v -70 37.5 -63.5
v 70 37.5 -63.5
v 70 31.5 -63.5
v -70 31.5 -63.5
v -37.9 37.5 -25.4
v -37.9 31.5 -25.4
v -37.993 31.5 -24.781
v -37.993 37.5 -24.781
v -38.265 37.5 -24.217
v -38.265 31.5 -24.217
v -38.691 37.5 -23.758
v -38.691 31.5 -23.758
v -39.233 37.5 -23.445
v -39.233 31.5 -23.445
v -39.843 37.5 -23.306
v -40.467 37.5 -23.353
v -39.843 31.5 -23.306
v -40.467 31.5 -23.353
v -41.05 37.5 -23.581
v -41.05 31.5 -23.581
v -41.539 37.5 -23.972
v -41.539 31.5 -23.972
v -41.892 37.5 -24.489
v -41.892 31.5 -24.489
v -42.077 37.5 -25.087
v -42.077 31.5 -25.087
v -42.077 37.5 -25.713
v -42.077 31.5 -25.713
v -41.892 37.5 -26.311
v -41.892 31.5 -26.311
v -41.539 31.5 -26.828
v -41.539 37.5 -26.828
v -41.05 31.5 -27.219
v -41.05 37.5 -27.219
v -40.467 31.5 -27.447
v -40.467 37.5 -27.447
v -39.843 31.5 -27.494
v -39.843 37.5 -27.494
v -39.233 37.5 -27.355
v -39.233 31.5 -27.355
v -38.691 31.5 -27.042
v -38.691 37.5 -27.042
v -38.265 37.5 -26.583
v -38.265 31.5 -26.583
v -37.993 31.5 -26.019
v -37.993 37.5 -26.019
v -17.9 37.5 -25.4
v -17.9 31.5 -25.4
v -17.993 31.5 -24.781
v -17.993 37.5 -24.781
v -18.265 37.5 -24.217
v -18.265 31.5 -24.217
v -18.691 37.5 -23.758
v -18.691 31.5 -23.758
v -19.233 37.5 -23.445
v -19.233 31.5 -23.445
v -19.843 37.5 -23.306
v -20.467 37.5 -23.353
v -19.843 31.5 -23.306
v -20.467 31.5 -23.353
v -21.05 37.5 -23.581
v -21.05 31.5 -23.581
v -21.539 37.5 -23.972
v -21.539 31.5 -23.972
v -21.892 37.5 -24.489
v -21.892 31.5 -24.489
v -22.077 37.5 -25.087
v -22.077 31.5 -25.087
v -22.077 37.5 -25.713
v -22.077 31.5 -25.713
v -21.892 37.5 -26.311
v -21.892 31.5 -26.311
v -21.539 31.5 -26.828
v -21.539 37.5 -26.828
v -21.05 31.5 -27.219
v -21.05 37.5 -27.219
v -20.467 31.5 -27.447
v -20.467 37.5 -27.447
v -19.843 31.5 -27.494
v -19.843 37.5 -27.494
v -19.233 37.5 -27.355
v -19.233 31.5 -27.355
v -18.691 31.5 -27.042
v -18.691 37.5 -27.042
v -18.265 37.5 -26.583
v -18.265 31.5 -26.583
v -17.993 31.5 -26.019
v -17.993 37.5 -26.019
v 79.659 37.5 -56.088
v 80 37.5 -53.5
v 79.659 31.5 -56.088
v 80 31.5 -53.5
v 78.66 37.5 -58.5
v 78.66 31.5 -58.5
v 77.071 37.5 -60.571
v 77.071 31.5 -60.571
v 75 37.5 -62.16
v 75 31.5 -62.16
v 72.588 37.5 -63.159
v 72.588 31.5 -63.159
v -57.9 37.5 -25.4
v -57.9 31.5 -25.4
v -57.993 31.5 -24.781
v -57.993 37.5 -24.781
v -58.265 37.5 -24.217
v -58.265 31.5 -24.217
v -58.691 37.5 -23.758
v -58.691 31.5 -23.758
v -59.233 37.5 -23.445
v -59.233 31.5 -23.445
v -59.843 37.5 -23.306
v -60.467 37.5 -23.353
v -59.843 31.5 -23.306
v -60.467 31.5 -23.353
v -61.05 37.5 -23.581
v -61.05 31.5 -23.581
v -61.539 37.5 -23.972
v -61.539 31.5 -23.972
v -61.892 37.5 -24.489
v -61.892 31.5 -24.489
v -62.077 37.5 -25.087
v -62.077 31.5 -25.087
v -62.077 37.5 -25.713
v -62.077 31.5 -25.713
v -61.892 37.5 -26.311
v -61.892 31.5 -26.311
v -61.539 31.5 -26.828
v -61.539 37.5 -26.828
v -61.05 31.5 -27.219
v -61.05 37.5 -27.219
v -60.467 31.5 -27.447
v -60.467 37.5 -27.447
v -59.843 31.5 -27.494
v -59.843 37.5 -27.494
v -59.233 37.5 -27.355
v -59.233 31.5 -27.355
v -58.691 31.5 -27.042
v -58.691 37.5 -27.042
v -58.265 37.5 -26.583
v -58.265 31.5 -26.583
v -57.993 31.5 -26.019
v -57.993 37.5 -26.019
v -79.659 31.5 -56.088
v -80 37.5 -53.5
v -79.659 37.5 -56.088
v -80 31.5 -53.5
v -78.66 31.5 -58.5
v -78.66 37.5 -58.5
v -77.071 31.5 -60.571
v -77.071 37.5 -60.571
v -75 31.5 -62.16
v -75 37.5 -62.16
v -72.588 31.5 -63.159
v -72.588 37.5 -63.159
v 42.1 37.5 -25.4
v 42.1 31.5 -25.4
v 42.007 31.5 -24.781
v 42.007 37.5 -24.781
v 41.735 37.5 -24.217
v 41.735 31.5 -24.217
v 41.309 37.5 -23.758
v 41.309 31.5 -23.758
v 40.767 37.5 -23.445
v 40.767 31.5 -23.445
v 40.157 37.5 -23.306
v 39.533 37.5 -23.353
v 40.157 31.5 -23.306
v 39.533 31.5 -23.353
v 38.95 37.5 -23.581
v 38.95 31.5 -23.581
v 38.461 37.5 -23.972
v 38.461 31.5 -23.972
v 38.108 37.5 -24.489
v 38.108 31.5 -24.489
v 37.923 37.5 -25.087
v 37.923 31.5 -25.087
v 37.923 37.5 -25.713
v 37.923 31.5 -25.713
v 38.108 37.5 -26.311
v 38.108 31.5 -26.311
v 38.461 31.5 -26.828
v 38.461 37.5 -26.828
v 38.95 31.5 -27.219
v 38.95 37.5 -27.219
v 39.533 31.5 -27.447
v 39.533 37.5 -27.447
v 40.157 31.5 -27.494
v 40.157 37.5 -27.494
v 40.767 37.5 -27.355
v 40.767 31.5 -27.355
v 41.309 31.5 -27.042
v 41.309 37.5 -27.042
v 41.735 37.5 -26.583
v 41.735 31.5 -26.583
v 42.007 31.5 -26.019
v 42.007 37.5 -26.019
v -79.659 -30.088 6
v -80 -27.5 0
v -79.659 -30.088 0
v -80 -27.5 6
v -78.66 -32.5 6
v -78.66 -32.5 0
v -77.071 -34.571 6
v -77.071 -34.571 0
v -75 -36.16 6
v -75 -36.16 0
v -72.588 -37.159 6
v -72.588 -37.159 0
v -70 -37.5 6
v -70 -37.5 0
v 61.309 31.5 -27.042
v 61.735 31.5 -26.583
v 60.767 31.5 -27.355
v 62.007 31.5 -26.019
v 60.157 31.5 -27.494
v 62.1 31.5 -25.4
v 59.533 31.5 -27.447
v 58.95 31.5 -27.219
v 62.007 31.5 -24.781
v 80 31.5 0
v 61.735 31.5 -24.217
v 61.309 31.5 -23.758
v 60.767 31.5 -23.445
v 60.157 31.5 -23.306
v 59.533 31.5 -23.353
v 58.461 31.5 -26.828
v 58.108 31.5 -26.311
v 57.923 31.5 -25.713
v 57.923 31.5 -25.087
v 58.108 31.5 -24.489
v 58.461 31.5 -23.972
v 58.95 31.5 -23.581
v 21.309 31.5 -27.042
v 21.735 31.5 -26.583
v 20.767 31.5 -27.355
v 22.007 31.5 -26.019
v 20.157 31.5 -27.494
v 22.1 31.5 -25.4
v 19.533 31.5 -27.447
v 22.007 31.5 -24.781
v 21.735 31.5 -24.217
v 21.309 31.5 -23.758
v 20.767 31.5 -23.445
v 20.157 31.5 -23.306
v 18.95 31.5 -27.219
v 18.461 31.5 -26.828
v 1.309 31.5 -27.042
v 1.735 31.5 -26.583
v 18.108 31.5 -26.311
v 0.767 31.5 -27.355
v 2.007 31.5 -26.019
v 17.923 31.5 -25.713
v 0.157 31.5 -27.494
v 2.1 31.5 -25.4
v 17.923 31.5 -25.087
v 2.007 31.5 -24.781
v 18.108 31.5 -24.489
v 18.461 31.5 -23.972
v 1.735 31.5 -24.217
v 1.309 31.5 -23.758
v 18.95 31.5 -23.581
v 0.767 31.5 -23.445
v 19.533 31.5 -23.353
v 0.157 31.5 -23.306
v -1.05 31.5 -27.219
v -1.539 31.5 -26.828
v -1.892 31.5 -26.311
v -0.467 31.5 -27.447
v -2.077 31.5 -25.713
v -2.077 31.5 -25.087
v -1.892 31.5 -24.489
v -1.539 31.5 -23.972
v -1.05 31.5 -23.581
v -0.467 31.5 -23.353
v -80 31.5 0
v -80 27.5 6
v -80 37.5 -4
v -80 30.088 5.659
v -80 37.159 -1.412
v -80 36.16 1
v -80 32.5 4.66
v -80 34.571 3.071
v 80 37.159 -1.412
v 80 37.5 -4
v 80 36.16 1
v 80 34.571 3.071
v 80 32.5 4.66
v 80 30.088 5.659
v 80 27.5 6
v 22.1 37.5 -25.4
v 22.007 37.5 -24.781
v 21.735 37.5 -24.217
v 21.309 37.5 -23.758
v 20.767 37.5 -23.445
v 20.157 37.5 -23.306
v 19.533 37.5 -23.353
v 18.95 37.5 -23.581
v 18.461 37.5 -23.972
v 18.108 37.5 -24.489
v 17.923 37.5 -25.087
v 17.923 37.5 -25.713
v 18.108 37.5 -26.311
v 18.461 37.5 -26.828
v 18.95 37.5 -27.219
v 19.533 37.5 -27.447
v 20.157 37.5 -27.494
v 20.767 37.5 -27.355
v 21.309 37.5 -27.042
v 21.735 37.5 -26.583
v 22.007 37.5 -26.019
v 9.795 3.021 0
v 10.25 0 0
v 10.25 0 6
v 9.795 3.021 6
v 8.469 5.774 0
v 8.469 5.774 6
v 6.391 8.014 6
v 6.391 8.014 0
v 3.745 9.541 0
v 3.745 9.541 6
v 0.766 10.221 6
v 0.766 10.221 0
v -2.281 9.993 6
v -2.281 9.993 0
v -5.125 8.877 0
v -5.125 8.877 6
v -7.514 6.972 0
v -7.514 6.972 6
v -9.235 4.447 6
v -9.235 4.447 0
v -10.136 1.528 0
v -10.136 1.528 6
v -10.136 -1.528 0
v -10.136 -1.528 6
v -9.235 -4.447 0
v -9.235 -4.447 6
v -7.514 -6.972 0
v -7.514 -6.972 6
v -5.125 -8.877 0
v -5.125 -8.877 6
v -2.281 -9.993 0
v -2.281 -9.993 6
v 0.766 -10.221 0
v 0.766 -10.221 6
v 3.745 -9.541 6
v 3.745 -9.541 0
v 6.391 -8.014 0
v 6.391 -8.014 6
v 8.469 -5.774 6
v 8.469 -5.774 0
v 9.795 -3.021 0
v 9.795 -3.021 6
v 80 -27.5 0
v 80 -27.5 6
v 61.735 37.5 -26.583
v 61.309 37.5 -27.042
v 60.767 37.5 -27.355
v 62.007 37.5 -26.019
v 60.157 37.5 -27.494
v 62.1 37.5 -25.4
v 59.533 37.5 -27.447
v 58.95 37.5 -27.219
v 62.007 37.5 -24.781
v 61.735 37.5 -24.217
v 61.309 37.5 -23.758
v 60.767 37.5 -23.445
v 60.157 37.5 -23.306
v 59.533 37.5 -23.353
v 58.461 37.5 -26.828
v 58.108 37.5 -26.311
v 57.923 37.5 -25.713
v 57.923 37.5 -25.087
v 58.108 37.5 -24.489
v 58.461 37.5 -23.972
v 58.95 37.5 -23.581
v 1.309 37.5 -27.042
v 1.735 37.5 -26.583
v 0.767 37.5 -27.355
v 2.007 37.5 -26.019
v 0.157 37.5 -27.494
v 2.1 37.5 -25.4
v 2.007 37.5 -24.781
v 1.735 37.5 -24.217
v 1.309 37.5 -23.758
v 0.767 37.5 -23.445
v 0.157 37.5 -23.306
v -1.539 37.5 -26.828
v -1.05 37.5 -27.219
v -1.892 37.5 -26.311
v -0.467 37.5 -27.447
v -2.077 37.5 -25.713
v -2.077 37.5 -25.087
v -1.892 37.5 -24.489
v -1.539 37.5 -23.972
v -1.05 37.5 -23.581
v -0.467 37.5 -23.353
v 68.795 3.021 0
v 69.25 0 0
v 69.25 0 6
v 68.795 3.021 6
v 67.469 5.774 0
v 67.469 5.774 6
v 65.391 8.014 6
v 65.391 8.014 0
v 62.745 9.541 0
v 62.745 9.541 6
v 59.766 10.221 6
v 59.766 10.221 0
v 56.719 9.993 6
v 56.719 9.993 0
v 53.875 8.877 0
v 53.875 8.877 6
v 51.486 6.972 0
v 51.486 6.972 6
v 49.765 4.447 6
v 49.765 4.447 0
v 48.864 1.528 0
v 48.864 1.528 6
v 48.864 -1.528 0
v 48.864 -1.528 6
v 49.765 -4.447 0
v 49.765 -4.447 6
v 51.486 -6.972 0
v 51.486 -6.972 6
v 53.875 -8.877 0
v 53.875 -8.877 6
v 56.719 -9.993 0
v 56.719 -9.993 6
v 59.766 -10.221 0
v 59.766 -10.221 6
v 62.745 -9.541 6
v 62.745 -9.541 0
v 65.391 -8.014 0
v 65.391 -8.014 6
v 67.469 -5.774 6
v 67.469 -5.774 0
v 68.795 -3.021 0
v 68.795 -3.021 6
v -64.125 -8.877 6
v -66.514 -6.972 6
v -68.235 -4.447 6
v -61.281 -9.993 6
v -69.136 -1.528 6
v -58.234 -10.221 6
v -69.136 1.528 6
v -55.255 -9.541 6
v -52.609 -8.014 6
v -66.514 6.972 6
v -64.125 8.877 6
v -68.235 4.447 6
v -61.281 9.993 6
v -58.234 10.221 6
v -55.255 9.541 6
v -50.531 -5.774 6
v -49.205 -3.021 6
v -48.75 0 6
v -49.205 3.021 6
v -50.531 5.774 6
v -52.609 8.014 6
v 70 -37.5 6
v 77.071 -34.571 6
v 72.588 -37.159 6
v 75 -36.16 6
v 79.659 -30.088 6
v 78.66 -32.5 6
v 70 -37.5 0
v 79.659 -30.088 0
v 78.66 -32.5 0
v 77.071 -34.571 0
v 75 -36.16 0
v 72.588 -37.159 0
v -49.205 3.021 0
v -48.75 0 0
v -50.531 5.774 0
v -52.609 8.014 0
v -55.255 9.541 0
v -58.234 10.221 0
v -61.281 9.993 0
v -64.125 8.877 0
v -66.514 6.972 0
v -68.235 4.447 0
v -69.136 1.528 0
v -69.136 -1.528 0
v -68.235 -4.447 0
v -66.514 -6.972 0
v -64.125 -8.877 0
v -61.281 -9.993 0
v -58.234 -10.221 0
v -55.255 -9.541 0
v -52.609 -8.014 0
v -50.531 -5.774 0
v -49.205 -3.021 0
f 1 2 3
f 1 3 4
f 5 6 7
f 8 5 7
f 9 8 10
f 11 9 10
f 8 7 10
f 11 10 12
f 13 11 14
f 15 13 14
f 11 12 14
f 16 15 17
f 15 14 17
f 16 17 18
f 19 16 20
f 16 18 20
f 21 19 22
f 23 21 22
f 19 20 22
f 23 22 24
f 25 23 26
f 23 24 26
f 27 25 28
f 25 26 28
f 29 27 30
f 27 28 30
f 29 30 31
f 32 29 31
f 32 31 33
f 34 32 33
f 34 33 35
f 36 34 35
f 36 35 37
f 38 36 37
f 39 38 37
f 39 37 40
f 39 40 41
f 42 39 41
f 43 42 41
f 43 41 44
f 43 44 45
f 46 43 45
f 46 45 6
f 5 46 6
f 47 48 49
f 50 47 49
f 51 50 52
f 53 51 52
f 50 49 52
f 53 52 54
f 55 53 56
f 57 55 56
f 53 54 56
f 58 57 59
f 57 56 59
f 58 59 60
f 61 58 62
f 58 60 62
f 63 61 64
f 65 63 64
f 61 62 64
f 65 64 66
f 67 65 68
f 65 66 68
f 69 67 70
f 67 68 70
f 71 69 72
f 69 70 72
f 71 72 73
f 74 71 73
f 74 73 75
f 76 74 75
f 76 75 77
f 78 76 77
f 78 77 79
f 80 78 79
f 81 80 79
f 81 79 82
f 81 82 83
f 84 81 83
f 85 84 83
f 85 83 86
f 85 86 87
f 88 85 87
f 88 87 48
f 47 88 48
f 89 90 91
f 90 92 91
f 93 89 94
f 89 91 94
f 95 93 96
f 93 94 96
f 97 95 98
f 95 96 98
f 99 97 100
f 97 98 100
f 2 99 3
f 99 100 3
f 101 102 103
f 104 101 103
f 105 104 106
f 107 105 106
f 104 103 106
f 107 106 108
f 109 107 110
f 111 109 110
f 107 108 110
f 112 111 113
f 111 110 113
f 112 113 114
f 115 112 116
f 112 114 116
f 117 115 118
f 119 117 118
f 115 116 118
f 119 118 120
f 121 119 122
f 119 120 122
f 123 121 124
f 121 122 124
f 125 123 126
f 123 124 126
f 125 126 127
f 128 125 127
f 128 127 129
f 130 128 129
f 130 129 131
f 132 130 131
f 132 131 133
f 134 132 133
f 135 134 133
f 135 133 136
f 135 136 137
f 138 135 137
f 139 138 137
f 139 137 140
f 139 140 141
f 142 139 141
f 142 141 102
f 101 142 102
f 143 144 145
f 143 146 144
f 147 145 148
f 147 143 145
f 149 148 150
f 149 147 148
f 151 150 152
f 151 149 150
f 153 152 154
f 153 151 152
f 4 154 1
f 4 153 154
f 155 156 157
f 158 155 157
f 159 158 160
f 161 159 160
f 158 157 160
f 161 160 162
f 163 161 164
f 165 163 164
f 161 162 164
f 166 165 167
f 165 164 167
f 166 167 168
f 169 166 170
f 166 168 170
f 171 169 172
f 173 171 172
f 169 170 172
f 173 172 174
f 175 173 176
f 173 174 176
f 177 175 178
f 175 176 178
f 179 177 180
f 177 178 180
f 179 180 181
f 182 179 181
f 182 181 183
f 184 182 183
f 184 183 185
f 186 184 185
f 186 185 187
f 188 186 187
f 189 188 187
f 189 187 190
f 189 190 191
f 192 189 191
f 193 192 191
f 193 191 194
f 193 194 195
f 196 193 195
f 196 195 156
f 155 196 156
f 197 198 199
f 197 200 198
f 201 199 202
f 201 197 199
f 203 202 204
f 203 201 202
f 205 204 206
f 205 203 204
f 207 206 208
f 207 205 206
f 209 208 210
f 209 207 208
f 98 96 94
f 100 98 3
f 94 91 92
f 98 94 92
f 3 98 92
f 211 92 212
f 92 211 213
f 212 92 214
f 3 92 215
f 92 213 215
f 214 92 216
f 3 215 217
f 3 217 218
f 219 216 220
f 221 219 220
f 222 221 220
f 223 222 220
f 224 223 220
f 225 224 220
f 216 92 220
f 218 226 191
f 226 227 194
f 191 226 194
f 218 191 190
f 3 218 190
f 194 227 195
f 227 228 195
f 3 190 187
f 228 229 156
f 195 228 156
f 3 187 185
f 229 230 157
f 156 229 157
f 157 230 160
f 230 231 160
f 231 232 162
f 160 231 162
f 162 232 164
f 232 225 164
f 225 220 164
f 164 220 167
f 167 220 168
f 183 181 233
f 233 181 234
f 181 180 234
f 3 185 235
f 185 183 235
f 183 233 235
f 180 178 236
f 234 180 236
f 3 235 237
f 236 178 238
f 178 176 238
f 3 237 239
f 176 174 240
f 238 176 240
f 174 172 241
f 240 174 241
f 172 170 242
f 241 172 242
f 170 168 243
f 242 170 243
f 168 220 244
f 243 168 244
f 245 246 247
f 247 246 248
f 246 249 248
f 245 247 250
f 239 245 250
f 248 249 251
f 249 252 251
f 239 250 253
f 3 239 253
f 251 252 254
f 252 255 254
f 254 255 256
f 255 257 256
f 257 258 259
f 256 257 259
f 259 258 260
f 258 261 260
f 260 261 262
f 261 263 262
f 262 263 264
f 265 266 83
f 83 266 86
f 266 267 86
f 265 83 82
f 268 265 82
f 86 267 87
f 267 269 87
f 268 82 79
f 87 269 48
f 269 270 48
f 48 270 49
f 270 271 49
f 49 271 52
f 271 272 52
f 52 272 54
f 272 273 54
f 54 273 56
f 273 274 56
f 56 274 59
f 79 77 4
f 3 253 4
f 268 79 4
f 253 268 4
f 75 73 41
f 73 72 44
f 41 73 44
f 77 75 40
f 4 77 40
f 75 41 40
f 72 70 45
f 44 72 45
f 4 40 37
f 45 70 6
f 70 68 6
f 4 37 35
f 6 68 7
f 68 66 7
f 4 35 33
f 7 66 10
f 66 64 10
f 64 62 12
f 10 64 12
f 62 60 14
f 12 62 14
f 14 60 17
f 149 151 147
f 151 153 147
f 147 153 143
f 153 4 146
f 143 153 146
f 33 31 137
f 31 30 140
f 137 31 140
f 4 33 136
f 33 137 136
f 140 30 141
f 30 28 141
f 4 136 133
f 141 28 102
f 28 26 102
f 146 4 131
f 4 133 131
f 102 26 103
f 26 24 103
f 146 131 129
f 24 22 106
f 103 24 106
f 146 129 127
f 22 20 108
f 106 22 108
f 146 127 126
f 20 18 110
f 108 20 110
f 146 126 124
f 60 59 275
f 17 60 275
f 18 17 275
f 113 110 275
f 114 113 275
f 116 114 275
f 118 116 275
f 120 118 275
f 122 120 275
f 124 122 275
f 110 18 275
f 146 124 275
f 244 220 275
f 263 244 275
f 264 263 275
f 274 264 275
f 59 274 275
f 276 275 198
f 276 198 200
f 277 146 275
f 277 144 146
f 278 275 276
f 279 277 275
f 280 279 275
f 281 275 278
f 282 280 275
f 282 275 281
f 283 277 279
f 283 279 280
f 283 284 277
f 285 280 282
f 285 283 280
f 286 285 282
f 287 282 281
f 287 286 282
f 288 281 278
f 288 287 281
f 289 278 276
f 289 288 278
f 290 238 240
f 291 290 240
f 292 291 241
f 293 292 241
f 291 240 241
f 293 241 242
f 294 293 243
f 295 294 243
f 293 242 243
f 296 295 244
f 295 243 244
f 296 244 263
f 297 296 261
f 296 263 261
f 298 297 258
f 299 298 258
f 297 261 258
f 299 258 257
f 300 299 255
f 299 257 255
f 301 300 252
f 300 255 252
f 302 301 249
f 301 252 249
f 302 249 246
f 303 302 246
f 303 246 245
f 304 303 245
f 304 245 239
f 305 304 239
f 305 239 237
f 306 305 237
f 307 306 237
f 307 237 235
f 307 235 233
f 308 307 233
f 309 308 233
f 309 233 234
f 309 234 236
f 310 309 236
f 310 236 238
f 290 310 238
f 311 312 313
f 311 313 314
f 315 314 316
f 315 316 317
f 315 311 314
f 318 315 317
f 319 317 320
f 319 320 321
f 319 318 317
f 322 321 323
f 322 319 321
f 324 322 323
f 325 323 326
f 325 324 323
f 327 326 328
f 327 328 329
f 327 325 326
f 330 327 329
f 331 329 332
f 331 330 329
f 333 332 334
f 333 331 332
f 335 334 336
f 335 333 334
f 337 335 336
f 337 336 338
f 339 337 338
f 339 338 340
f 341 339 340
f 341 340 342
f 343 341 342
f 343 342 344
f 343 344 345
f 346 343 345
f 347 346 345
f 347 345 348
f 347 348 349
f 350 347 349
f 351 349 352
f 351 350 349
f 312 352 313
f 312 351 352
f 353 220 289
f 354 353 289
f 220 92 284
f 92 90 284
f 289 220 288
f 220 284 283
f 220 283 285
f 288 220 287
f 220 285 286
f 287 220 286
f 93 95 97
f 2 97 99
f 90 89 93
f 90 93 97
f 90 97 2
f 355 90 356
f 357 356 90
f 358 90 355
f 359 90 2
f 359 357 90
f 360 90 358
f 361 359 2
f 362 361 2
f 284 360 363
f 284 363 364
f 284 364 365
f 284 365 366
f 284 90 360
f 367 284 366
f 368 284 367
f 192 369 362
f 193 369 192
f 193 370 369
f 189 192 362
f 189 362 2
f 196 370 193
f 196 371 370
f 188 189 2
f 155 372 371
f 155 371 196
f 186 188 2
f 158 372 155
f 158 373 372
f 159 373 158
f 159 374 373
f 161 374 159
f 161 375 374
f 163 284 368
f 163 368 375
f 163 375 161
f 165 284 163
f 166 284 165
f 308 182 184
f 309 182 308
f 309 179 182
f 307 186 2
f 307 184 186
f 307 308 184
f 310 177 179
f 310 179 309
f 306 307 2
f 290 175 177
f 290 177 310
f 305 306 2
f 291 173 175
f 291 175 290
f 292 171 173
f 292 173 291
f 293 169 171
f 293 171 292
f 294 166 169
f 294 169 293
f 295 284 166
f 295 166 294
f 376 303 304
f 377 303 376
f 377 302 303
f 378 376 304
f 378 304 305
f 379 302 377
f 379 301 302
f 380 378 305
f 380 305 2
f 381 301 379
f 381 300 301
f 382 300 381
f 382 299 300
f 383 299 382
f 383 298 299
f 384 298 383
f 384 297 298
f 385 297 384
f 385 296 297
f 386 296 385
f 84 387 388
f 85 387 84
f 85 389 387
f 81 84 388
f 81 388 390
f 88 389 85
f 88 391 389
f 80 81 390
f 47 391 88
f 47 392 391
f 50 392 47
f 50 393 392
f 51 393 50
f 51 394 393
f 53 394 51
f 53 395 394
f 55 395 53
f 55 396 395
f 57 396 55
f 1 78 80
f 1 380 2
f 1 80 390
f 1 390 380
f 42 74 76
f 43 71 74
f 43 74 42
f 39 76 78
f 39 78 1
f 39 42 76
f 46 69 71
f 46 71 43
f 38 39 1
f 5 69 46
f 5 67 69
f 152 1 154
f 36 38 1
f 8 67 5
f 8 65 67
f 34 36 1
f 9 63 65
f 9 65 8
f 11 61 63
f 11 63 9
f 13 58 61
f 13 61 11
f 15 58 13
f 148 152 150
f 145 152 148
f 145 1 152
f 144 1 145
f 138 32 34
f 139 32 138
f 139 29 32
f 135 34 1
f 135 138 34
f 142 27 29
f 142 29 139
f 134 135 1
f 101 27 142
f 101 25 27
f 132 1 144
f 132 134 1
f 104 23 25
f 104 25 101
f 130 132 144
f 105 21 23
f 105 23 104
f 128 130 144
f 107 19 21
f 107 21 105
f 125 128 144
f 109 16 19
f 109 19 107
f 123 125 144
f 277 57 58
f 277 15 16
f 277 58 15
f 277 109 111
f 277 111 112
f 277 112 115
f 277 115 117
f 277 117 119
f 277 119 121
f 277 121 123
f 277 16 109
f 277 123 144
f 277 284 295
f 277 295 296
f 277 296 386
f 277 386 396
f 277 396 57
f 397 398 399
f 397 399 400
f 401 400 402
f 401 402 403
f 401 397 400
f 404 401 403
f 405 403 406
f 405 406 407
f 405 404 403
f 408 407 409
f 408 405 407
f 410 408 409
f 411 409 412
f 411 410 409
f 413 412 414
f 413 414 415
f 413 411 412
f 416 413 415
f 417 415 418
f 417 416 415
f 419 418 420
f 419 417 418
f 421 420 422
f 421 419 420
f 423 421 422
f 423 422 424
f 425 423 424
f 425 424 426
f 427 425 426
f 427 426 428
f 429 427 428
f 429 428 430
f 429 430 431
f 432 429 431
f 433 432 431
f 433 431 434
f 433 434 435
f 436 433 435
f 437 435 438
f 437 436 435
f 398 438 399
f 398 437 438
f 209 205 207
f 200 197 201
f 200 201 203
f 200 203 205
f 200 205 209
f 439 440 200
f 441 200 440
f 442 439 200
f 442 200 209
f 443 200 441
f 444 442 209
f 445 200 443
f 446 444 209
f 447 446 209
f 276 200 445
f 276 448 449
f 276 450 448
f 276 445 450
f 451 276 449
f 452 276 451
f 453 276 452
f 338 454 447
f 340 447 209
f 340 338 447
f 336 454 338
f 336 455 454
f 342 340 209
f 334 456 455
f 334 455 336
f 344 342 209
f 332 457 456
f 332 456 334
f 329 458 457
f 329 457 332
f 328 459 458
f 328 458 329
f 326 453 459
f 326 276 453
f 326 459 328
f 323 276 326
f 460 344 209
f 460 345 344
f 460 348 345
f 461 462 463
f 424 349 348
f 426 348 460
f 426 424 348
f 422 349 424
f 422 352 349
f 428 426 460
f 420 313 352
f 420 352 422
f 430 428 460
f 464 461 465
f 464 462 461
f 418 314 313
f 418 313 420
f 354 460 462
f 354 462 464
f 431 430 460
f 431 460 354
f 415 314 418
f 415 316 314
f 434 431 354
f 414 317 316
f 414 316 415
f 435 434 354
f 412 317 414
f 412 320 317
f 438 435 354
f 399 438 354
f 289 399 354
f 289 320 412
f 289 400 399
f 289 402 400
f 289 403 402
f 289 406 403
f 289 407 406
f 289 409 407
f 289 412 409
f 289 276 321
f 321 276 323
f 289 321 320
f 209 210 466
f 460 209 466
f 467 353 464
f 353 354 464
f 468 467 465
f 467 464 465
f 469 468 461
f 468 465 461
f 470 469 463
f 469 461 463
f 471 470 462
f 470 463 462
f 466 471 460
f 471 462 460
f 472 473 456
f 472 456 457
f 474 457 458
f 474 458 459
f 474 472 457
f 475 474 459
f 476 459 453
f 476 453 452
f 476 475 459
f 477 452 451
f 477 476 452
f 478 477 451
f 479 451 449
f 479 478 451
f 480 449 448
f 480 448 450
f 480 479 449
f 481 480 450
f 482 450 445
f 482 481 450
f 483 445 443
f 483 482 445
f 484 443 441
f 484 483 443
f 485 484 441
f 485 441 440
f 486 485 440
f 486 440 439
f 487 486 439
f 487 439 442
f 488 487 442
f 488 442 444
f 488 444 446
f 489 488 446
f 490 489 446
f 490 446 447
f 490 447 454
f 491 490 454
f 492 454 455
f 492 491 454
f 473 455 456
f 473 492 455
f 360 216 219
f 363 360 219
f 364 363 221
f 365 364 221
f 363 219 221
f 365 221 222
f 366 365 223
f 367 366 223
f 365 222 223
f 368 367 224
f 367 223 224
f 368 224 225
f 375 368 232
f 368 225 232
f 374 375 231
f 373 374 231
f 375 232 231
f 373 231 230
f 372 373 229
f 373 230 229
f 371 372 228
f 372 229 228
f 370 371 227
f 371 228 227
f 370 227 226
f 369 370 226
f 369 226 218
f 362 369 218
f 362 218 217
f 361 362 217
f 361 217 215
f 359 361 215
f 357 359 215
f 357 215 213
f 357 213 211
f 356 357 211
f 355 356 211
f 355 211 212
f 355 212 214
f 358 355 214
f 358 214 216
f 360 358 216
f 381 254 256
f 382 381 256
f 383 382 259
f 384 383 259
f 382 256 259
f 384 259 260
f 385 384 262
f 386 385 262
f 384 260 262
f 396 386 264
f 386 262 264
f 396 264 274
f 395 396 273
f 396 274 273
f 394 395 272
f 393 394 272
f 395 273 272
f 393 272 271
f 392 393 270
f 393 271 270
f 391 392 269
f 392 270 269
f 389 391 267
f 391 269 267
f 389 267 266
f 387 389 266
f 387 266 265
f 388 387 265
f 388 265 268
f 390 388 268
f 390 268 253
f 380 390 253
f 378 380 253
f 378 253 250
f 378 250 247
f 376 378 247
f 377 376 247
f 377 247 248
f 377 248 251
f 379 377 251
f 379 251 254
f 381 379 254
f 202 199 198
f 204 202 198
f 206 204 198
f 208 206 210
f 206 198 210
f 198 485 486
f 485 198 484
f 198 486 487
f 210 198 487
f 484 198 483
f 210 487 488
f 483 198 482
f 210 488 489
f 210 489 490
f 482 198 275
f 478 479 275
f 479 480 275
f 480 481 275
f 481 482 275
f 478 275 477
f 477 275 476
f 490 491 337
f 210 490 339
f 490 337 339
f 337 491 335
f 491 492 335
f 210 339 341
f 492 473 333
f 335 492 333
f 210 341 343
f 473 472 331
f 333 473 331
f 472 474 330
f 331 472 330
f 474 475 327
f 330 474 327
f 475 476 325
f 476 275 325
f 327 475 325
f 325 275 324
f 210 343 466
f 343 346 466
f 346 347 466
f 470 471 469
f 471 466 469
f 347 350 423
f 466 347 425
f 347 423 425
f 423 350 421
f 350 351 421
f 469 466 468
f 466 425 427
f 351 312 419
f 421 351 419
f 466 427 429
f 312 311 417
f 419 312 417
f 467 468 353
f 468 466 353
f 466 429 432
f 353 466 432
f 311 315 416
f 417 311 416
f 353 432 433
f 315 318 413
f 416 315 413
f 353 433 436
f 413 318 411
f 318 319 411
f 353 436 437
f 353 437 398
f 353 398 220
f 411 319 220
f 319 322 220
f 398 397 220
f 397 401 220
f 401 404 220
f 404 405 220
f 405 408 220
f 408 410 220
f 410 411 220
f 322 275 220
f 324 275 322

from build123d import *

# Parameters (mm, degrees)
F0_W     = 160
F0_H     = 75
F0_R     = 10.25
F1_DEPTH = 6
F2_W     = 160
F2_H     = 63.5
F3_DEPTH = 6
F4_R     = 10
F5_R     = 2.1
F6_DEPTH = 25


with BuildPart() as f1:
    # F0 (on Top) → F1 (new body)
    with BuildSketch(Plane.XY):
        Rectangle(F0_W, F0_H)
        with Locations((-59, 0)):
            Circle(F0_R, mode=Mode.SUBTRACT)
        Circle(F0_R, mode=Mode.SUBTRACT)
        with Locations((59, 0)):
            Circle(F0_R, mode=Mode.SUBTRACT)
    extrude(amount=F1_DEPTH)

    # F2 (on face) → F3 (join)
    with BuildSketch(Plane(origin=(0, 37.5, 0), x_dir=(-1, 0, 0), z_dir=(0, 1, 0))):
        with Locations((0, -31.75)):
            Rectangle(F2_W, F2_H)
    extrude(amount=-F3_DEPTH)

    # F4
    f4_edges = [f1.edges().sort_by_distance(p)[0] for p in [
        (0, 37.5, 6),
        (-80, 34.5, -63.5),
        (80, 34.5, -63.5),
        (80, -37.5, 3),
        (-80, -37.5, 3),
    ]]
    fillet(f4_edges, radius=F4_R)

    # F5 (on face) → F6 (cut)
    with BuildSketch(Plane.XZ.offset(-31.5)):
        with Locations((-60, -25.4)):
            Circle(F5_R)
        with Locations((-40, -25.4)):
            Circle(F5_R)
        with Locations((-20, -25.4)):
            Circle(F5_R)
        with Locations((0, -25.4)):
            Circle(F5_R)
        with Locations((20, -25.4)):
            Circle(F5_R)
        with Locations((40, -25.4)):
            Circle(F5_R)
        with Locations((60, -25.4)):
            Circle(F5_R)
    extrude(amount=-F6_DEPTH, mode=Mode.SUBTRACT)


solid = f1.part
